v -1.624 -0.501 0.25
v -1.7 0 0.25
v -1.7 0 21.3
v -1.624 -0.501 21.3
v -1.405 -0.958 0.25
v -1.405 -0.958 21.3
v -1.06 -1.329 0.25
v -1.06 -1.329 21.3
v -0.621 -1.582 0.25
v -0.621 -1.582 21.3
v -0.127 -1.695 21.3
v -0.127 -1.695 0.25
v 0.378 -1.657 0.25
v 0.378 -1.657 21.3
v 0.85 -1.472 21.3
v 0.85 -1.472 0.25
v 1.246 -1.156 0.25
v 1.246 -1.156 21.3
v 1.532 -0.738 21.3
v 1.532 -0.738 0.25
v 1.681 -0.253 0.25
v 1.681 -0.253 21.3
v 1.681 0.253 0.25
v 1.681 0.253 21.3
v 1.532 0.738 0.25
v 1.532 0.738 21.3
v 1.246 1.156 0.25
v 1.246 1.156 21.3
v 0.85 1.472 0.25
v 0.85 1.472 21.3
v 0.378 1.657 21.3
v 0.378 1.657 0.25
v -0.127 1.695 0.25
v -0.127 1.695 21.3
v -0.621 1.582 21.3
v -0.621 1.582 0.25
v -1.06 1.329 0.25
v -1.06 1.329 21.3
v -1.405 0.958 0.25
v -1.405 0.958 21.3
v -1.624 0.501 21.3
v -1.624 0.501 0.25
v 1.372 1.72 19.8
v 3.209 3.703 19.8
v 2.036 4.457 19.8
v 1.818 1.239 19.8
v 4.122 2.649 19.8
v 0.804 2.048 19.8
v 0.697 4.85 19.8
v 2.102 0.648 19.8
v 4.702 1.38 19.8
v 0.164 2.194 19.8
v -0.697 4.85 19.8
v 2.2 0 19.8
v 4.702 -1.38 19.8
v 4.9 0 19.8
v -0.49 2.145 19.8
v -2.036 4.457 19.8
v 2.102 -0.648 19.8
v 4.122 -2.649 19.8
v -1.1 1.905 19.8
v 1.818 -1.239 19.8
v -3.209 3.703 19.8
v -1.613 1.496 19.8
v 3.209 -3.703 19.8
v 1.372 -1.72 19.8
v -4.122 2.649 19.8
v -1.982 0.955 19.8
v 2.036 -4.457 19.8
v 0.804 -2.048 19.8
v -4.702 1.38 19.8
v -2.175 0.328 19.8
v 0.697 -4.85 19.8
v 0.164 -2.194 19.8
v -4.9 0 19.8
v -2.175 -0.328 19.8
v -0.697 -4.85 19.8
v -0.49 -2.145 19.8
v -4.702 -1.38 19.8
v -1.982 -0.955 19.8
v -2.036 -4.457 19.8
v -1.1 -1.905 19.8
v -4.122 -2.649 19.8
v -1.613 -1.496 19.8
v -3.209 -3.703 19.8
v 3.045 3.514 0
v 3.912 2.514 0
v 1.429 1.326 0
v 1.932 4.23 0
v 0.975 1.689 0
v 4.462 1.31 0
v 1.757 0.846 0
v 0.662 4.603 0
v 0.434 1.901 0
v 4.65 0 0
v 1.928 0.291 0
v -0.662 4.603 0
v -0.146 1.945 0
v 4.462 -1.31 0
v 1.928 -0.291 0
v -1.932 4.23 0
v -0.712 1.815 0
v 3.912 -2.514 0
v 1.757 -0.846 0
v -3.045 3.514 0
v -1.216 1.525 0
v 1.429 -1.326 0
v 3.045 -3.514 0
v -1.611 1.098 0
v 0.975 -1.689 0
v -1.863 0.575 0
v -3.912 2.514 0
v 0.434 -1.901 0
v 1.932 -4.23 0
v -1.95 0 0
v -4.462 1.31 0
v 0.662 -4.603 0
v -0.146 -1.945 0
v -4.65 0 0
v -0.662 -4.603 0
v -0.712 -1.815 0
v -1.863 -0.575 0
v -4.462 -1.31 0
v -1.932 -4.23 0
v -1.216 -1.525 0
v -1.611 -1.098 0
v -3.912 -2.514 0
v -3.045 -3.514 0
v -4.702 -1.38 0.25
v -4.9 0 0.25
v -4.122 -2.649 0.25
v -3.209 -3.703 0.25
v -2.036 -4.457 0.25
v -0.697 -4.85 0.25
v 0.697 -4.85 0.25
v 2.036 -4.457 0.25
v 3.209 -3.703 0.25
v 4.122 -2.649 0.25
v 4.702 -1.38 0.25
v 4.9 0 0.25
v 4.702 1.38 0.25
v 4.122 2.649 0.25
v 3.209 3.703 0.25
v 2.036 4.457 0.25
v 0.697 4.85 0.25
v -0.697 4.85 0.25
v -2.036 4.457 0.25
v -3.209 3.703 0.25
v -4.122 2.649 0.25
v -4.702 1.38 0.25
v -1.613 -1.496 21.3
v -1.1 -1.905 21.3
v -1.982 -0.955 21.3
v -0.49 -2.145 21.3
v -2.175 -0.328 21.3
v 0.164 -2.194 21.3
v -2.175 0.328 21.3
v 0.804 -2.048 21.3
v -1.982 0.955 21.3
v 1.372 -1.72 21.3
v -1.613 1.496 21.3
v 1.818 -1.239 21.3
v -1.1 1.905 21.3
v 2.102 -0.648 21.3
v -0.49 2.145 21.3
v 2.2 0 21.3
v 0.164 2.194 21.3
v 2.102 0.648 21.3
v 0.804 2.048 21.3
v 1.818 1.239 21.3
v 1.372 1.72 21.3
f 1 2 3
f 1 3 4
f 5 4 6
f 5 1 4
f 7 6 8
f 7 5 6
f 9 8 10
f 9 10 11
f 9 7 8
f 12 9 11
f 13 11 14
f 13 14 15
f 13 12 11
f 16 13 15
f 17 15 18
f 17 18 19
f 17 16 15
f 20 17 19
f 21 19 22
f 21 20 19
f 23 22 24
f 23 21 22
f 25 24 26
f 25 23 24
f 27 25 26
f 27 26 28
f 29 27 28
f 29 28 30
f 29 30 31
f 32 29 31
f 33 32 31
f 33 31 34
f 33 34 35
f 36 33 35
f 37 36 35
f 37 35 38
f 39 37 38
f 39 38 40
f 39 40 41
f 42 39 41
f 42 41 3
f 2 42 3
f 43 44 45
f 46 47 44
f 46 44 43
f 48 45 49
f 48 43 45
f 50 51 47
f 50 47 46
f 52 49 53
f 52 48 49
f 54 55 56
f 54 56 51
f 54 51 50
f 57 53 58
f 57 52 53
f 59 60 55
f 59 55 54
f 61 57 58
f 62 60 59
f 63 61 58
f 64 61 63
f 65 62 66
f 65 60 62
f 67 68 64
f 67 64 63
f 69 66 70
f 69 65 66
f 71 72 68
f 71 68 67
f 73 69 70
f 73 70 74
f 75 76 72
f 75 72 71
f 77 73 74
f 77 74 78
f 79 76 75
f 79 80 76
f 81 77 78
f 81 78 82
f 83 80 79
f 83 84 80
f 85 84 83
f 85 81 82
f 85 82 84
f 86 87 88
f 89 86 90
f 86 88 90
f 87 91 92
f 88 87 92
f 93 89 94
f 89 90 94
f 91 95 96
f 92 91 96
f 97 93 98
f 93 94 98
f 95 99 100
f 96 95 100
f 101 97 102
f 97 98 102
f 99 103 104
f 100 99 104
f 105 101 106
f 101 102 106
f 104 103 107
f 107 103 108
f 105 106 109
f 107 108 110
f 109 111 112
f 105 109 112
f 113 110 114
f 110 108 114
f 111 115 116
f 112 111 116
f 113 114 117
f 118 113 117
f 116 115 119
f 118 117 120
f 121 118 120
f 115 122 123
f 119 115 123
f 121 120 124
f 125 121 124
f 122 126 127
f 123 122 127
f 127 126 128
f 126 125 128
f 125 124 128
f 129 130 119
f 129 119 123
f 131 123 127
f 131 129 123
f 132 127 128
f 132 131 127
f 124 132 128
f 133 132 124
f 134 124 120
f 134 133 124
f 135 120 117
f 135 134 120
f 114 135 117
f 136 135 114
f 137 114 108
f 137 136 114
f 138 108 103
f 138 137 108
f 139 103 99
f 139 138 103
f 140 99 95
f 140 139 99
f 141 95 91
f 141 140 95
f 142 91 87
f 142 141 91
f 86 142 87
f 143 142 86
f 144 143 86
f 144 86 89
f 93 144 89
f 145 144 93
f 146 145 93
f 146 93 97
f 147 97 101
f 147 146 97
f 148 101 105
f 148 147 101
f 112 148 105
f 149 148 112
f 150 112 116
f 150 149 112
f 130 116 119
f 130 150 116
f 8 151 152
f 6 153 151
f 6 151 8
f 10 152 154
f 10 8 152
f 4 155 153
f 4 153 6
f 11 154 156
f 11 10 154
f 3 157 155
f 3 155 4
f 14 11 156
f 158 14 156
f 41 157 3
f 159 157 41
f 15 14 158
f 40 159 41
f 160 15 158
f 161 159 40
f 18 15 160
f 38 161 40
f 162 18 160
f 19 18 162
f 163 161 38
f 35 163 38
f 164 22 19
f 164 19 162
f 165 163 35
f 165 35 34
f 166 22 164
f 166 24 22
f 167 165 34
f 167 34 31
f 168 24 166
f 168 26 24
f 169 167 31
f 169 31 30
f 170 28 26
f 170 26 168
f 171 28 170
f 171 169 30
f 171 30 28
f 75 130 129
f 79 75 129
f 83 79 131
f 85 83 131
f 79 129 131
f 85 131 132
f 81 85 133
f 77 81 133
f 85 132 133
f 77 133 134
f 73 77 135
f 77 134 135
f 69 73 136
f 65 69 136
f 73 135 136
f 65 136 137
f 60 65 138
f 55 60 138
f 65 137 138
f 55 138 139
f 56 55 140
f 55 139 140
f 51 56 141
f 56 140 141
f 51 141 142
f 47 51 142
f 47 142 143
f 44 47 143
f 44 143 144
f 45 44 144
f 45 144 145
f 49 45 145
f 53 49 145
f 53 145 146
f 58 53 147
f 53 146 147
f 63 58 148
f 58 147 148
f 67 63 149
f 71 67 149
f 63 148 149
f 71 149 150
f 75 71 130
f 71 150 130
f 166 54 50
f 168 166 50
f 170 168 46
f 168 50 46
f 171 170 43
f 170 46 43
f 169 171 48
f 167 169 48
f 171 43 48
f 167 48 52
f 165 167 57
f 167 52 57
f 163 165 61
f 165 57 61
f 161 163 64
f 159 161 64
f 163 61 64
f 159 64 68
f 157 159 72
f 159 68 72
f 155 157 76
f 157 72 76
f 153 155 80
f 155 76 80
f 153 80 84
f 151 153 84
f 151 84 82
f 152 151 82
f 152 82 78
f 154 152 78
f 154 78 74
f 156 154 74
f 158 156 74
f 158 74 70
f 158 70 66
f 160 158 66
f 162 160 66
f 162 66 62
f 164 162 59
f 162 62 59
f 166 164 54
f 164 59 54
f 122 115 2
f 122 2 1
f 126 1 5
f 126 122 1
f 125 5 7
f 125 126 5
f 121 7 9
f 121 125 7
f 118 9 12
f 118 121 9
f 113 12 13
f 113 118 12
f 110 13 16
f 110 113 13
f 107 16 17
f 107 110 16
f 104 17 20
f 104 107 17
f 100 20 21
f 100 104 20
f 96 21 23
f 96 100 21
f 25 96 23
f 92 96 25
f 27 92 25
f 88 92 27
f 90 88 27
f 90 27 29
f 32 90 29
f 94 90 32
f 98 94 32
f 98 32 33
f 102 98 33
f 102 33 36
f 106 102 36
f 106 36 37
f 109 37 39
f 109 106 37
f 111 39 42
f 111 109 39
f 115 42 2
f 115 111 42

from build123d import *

# Parameters (mm, degrees)
SKETCH1_R           = 4.9
SKETCH1_R_2         = 1.7
BOSS_EXTRUDE1_DEPTH = 19.8
SKETCH2_R           = 2.2
SKETCH2_R_2         = 1.7
BOSS_EXTRUDE2_DEPTH = 1.5
CHAMFER1_SIZE       = 0.25


with BuildPart() as part:
    # Sketch1 → Boss-Extrude1 (new body)
    with BuildSketch(Plane.XY):
        with Locations(Location((0, 0, 0), (0, 0, 180))):
            Circle(SKETCH1_R)
        with Locations(Location((0, 0, 0), (0, 0, 180))):
            Circle(SKETCH1_R_2, mode=Mode.SUBTRACT)
    extrude(amount=BOSS_EXTRUDE1_DEPTH)

    # Sketch2 → Boss-Extrude2 (add)
    with BuildSketch(Plane.XY.offset(19.8)):
        Circle(SKETCH2_R)
        with Locations(Location((0, 0, 0), (0, 0, 180))):
            Circle(SKETCH2_R_2, mode=Mode.SUBTRACT)
    extrude(amount=BOSS_EXTRUDE2_DEPTH)

    # Chamfer1
    chamfer1_edges = [part.edges().sort_by_distance(p)[0] for p in [
        (4.9, 0, 0),
        (1.7, 0, 0),
    ]]
    chamfer(chamfer1_edges, length=CHAMFER1_SIZE)


solid = part.part
